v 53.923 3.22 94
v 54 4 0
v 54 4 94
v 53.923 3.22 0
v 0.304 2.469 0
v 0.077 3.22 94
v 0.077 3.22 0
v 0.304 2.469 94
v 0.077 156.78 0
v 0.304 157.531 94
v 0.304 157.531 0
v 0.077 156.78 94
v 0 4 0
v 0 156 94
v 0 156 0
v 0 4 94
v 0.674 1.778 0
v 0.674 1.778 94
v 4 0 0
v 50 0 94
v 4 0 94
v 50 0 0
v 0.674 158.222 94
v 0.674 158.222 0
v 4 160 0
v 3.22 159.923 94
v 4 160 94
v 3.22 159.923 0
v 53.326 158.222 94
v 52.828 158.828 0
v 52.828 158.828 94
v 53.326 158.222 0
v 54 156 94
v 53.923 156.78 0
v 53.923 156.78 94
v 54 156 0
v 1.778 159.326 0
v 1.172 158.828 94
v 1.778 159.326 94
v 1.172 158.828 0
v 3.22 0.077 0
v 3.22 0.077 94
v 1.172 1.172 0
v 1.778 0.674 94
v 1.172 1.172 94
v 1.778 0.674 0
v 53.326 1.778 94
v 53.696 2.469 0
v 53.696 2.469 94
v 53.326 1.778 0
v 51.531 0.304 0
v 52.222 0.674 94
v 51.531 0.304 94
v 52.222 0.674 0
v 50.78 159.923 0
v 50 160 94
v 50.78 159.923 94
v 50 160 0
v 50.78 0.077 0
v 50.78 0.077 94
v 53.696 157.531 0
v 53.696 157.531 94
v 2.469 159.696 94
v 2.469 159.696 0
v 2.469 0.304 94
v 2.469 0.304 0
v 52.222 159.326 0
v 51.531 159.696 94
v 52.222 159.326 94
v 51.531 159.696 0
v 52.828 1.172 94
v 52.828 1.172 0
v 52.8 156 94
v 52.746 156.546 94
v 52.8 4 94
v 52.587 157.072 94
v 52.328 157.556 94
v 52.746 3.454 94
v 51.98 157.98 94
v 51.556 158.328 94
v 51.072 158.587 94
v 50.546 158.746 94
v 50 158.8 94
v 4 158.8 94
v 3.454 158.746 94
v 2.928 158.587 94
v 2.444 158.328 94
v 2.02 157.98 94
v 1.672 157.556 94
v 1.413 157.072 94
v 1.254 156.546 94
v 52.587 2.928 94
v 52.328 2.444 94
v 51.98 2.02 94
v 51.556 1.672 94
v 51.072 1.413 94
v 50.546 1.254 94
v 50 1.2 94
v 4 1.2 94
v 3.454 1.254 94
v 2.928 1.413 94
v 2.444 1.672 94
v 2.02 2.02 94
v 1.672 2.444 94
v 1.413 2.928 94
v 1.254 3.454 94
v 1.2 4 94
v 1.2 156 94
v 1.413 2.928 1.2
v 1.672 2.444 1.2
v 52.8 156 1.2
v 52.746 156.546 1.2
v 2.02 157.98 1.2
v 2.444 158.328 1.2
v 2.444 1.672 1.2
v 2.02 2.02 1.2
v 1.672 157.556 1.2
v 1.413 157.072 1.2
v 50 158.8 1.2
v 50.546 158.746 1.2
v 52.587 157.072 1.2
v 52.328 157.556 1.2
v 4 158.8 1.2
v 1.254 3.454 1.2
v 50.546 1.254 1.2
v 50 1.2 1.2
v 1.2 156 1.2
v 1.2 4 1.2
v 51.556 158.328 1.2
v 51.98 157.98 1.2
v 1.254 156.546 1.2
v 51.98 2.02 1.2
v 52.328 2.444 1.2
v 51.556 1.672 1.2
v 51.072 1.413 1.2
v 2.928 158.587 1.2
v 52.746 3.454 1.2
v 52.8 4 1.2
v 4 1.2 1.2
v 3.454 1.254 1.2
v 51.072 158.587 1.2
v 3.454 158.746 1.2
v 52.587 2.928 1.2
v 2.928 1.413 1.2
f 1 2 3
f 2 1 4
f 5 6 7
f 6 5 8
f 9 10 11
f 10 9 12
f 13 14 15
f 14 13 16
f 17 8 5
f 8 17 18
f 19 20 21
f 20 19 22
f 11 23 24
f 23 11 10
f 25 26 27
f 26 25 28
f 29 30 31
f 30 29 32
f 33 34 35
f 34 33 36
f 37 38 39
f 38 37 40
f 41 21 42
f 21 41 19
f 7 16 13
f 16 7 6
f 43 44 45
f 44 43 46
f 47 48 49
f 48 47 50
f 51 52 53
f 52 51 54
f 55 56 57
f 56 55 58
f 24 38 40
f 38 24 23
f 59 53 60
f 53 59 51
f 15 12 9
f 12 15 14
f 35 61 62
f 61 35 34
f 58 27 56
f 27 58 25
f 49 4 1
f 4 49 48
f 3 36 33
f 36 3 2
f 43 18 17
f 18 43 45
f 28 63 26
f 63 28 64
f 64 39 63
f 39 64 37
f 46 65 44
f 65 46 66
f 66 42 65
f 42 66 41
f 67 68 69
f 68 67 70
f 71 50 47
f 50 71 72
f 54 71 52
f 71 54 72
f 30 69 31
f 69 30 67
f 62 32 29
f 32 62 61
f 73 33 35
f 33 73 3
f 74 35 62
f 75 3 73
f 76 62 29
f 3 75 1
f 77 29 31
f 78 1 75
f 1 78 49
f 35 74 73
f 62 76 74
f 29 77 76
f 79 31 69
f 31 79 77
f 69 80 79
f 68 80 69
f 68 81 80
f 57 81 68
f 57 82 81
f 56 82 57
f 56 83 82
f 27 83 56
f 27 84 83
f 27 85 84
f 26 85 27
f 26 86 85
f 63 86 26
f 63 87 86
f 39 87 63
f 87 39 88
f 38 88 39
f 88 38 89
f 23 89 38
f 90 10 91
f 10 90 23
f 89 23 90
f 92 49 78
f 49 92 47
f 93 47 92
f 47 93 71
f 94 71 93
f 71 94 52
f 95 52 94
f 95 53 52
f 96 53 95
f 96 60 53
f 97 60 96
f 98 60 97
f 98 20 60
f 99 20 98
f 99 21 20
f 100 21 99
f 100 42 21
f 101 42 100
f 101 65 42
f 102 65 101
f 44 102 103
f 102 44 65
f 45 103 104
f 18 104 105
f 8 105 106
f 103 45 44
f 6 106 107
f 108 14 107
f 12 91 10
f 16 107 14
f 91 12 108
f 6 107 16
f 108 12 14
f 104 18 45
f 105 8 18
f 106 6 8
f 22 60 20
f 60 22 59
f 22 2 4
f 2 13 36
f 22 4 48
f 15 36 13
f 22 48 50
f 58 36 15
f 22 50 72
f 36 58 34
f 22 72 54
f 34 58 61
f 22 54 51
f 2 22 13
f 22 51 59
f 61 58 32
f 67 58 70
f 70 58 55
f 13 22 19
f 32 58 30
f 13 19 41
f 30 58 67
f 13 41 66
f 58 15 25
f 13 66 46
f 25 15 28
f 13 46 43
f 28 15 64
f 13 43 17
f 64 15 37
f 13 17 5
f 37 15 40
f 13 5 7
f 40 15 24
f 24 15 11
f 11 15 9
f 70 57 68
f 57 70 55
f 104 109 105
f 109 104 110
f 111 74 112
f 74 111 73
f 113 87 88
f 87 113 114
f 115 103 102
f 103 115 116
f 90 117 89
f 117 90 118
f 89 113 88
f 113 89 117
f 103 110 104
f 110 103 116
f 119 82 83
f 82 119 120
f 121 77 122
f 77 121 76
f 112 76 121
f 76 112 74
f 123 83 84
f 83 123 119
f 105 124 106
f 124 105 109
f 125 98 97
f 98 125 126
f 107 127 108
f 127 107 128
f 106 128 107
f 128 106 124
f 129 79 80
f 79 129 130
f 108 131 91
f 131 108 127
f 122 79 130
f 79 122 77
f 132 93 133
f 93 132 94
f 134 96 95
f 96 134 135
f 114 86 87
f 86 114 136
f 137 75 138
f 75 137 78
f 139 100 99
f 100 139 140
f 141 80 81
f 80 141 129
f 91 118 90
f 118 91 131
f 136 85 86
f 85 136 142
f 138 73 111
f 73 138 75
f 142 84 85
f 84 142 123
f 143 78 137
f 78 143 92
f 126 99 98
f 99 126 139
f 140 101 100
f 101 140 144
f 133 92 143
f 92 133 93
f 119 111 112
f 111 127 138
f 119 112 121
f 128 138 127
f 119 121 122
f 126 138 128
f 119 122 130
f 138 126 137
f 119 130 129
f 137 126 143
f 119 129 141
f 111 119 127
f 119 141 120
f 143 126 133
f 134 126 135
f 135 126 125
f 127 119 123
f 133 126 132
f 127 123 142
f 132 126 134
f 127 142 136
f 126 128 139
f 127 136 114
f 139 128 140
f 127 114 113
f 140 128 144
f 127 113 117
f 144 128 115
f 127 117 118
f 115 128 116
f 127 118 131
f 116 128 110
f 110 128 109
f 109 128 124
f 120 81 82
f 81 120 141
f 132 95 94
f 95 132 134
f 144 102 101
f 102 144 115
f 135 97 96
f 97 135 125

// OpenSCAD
w = 54;
l = 160;
h = 94;
t = 1.2;
r = 4;  // corner radius

module rounded(w, l, r) {
    hull() {
        translate([r, r])     circle(r, $fn=32);
        translate([w-r, r])   circle(r, $fn=32);
        translate([r, l-r])   circle(r, $fn=32);
        translate([w-r, l-r]) circle(r, $fn=32);
    }
}

difference() {
    linear_extrude(h) rounded(w, l, r);
    translate([t, t, t]) linear_extrude(h) rounded(w - t*2, l - t*2, r - t);
}
